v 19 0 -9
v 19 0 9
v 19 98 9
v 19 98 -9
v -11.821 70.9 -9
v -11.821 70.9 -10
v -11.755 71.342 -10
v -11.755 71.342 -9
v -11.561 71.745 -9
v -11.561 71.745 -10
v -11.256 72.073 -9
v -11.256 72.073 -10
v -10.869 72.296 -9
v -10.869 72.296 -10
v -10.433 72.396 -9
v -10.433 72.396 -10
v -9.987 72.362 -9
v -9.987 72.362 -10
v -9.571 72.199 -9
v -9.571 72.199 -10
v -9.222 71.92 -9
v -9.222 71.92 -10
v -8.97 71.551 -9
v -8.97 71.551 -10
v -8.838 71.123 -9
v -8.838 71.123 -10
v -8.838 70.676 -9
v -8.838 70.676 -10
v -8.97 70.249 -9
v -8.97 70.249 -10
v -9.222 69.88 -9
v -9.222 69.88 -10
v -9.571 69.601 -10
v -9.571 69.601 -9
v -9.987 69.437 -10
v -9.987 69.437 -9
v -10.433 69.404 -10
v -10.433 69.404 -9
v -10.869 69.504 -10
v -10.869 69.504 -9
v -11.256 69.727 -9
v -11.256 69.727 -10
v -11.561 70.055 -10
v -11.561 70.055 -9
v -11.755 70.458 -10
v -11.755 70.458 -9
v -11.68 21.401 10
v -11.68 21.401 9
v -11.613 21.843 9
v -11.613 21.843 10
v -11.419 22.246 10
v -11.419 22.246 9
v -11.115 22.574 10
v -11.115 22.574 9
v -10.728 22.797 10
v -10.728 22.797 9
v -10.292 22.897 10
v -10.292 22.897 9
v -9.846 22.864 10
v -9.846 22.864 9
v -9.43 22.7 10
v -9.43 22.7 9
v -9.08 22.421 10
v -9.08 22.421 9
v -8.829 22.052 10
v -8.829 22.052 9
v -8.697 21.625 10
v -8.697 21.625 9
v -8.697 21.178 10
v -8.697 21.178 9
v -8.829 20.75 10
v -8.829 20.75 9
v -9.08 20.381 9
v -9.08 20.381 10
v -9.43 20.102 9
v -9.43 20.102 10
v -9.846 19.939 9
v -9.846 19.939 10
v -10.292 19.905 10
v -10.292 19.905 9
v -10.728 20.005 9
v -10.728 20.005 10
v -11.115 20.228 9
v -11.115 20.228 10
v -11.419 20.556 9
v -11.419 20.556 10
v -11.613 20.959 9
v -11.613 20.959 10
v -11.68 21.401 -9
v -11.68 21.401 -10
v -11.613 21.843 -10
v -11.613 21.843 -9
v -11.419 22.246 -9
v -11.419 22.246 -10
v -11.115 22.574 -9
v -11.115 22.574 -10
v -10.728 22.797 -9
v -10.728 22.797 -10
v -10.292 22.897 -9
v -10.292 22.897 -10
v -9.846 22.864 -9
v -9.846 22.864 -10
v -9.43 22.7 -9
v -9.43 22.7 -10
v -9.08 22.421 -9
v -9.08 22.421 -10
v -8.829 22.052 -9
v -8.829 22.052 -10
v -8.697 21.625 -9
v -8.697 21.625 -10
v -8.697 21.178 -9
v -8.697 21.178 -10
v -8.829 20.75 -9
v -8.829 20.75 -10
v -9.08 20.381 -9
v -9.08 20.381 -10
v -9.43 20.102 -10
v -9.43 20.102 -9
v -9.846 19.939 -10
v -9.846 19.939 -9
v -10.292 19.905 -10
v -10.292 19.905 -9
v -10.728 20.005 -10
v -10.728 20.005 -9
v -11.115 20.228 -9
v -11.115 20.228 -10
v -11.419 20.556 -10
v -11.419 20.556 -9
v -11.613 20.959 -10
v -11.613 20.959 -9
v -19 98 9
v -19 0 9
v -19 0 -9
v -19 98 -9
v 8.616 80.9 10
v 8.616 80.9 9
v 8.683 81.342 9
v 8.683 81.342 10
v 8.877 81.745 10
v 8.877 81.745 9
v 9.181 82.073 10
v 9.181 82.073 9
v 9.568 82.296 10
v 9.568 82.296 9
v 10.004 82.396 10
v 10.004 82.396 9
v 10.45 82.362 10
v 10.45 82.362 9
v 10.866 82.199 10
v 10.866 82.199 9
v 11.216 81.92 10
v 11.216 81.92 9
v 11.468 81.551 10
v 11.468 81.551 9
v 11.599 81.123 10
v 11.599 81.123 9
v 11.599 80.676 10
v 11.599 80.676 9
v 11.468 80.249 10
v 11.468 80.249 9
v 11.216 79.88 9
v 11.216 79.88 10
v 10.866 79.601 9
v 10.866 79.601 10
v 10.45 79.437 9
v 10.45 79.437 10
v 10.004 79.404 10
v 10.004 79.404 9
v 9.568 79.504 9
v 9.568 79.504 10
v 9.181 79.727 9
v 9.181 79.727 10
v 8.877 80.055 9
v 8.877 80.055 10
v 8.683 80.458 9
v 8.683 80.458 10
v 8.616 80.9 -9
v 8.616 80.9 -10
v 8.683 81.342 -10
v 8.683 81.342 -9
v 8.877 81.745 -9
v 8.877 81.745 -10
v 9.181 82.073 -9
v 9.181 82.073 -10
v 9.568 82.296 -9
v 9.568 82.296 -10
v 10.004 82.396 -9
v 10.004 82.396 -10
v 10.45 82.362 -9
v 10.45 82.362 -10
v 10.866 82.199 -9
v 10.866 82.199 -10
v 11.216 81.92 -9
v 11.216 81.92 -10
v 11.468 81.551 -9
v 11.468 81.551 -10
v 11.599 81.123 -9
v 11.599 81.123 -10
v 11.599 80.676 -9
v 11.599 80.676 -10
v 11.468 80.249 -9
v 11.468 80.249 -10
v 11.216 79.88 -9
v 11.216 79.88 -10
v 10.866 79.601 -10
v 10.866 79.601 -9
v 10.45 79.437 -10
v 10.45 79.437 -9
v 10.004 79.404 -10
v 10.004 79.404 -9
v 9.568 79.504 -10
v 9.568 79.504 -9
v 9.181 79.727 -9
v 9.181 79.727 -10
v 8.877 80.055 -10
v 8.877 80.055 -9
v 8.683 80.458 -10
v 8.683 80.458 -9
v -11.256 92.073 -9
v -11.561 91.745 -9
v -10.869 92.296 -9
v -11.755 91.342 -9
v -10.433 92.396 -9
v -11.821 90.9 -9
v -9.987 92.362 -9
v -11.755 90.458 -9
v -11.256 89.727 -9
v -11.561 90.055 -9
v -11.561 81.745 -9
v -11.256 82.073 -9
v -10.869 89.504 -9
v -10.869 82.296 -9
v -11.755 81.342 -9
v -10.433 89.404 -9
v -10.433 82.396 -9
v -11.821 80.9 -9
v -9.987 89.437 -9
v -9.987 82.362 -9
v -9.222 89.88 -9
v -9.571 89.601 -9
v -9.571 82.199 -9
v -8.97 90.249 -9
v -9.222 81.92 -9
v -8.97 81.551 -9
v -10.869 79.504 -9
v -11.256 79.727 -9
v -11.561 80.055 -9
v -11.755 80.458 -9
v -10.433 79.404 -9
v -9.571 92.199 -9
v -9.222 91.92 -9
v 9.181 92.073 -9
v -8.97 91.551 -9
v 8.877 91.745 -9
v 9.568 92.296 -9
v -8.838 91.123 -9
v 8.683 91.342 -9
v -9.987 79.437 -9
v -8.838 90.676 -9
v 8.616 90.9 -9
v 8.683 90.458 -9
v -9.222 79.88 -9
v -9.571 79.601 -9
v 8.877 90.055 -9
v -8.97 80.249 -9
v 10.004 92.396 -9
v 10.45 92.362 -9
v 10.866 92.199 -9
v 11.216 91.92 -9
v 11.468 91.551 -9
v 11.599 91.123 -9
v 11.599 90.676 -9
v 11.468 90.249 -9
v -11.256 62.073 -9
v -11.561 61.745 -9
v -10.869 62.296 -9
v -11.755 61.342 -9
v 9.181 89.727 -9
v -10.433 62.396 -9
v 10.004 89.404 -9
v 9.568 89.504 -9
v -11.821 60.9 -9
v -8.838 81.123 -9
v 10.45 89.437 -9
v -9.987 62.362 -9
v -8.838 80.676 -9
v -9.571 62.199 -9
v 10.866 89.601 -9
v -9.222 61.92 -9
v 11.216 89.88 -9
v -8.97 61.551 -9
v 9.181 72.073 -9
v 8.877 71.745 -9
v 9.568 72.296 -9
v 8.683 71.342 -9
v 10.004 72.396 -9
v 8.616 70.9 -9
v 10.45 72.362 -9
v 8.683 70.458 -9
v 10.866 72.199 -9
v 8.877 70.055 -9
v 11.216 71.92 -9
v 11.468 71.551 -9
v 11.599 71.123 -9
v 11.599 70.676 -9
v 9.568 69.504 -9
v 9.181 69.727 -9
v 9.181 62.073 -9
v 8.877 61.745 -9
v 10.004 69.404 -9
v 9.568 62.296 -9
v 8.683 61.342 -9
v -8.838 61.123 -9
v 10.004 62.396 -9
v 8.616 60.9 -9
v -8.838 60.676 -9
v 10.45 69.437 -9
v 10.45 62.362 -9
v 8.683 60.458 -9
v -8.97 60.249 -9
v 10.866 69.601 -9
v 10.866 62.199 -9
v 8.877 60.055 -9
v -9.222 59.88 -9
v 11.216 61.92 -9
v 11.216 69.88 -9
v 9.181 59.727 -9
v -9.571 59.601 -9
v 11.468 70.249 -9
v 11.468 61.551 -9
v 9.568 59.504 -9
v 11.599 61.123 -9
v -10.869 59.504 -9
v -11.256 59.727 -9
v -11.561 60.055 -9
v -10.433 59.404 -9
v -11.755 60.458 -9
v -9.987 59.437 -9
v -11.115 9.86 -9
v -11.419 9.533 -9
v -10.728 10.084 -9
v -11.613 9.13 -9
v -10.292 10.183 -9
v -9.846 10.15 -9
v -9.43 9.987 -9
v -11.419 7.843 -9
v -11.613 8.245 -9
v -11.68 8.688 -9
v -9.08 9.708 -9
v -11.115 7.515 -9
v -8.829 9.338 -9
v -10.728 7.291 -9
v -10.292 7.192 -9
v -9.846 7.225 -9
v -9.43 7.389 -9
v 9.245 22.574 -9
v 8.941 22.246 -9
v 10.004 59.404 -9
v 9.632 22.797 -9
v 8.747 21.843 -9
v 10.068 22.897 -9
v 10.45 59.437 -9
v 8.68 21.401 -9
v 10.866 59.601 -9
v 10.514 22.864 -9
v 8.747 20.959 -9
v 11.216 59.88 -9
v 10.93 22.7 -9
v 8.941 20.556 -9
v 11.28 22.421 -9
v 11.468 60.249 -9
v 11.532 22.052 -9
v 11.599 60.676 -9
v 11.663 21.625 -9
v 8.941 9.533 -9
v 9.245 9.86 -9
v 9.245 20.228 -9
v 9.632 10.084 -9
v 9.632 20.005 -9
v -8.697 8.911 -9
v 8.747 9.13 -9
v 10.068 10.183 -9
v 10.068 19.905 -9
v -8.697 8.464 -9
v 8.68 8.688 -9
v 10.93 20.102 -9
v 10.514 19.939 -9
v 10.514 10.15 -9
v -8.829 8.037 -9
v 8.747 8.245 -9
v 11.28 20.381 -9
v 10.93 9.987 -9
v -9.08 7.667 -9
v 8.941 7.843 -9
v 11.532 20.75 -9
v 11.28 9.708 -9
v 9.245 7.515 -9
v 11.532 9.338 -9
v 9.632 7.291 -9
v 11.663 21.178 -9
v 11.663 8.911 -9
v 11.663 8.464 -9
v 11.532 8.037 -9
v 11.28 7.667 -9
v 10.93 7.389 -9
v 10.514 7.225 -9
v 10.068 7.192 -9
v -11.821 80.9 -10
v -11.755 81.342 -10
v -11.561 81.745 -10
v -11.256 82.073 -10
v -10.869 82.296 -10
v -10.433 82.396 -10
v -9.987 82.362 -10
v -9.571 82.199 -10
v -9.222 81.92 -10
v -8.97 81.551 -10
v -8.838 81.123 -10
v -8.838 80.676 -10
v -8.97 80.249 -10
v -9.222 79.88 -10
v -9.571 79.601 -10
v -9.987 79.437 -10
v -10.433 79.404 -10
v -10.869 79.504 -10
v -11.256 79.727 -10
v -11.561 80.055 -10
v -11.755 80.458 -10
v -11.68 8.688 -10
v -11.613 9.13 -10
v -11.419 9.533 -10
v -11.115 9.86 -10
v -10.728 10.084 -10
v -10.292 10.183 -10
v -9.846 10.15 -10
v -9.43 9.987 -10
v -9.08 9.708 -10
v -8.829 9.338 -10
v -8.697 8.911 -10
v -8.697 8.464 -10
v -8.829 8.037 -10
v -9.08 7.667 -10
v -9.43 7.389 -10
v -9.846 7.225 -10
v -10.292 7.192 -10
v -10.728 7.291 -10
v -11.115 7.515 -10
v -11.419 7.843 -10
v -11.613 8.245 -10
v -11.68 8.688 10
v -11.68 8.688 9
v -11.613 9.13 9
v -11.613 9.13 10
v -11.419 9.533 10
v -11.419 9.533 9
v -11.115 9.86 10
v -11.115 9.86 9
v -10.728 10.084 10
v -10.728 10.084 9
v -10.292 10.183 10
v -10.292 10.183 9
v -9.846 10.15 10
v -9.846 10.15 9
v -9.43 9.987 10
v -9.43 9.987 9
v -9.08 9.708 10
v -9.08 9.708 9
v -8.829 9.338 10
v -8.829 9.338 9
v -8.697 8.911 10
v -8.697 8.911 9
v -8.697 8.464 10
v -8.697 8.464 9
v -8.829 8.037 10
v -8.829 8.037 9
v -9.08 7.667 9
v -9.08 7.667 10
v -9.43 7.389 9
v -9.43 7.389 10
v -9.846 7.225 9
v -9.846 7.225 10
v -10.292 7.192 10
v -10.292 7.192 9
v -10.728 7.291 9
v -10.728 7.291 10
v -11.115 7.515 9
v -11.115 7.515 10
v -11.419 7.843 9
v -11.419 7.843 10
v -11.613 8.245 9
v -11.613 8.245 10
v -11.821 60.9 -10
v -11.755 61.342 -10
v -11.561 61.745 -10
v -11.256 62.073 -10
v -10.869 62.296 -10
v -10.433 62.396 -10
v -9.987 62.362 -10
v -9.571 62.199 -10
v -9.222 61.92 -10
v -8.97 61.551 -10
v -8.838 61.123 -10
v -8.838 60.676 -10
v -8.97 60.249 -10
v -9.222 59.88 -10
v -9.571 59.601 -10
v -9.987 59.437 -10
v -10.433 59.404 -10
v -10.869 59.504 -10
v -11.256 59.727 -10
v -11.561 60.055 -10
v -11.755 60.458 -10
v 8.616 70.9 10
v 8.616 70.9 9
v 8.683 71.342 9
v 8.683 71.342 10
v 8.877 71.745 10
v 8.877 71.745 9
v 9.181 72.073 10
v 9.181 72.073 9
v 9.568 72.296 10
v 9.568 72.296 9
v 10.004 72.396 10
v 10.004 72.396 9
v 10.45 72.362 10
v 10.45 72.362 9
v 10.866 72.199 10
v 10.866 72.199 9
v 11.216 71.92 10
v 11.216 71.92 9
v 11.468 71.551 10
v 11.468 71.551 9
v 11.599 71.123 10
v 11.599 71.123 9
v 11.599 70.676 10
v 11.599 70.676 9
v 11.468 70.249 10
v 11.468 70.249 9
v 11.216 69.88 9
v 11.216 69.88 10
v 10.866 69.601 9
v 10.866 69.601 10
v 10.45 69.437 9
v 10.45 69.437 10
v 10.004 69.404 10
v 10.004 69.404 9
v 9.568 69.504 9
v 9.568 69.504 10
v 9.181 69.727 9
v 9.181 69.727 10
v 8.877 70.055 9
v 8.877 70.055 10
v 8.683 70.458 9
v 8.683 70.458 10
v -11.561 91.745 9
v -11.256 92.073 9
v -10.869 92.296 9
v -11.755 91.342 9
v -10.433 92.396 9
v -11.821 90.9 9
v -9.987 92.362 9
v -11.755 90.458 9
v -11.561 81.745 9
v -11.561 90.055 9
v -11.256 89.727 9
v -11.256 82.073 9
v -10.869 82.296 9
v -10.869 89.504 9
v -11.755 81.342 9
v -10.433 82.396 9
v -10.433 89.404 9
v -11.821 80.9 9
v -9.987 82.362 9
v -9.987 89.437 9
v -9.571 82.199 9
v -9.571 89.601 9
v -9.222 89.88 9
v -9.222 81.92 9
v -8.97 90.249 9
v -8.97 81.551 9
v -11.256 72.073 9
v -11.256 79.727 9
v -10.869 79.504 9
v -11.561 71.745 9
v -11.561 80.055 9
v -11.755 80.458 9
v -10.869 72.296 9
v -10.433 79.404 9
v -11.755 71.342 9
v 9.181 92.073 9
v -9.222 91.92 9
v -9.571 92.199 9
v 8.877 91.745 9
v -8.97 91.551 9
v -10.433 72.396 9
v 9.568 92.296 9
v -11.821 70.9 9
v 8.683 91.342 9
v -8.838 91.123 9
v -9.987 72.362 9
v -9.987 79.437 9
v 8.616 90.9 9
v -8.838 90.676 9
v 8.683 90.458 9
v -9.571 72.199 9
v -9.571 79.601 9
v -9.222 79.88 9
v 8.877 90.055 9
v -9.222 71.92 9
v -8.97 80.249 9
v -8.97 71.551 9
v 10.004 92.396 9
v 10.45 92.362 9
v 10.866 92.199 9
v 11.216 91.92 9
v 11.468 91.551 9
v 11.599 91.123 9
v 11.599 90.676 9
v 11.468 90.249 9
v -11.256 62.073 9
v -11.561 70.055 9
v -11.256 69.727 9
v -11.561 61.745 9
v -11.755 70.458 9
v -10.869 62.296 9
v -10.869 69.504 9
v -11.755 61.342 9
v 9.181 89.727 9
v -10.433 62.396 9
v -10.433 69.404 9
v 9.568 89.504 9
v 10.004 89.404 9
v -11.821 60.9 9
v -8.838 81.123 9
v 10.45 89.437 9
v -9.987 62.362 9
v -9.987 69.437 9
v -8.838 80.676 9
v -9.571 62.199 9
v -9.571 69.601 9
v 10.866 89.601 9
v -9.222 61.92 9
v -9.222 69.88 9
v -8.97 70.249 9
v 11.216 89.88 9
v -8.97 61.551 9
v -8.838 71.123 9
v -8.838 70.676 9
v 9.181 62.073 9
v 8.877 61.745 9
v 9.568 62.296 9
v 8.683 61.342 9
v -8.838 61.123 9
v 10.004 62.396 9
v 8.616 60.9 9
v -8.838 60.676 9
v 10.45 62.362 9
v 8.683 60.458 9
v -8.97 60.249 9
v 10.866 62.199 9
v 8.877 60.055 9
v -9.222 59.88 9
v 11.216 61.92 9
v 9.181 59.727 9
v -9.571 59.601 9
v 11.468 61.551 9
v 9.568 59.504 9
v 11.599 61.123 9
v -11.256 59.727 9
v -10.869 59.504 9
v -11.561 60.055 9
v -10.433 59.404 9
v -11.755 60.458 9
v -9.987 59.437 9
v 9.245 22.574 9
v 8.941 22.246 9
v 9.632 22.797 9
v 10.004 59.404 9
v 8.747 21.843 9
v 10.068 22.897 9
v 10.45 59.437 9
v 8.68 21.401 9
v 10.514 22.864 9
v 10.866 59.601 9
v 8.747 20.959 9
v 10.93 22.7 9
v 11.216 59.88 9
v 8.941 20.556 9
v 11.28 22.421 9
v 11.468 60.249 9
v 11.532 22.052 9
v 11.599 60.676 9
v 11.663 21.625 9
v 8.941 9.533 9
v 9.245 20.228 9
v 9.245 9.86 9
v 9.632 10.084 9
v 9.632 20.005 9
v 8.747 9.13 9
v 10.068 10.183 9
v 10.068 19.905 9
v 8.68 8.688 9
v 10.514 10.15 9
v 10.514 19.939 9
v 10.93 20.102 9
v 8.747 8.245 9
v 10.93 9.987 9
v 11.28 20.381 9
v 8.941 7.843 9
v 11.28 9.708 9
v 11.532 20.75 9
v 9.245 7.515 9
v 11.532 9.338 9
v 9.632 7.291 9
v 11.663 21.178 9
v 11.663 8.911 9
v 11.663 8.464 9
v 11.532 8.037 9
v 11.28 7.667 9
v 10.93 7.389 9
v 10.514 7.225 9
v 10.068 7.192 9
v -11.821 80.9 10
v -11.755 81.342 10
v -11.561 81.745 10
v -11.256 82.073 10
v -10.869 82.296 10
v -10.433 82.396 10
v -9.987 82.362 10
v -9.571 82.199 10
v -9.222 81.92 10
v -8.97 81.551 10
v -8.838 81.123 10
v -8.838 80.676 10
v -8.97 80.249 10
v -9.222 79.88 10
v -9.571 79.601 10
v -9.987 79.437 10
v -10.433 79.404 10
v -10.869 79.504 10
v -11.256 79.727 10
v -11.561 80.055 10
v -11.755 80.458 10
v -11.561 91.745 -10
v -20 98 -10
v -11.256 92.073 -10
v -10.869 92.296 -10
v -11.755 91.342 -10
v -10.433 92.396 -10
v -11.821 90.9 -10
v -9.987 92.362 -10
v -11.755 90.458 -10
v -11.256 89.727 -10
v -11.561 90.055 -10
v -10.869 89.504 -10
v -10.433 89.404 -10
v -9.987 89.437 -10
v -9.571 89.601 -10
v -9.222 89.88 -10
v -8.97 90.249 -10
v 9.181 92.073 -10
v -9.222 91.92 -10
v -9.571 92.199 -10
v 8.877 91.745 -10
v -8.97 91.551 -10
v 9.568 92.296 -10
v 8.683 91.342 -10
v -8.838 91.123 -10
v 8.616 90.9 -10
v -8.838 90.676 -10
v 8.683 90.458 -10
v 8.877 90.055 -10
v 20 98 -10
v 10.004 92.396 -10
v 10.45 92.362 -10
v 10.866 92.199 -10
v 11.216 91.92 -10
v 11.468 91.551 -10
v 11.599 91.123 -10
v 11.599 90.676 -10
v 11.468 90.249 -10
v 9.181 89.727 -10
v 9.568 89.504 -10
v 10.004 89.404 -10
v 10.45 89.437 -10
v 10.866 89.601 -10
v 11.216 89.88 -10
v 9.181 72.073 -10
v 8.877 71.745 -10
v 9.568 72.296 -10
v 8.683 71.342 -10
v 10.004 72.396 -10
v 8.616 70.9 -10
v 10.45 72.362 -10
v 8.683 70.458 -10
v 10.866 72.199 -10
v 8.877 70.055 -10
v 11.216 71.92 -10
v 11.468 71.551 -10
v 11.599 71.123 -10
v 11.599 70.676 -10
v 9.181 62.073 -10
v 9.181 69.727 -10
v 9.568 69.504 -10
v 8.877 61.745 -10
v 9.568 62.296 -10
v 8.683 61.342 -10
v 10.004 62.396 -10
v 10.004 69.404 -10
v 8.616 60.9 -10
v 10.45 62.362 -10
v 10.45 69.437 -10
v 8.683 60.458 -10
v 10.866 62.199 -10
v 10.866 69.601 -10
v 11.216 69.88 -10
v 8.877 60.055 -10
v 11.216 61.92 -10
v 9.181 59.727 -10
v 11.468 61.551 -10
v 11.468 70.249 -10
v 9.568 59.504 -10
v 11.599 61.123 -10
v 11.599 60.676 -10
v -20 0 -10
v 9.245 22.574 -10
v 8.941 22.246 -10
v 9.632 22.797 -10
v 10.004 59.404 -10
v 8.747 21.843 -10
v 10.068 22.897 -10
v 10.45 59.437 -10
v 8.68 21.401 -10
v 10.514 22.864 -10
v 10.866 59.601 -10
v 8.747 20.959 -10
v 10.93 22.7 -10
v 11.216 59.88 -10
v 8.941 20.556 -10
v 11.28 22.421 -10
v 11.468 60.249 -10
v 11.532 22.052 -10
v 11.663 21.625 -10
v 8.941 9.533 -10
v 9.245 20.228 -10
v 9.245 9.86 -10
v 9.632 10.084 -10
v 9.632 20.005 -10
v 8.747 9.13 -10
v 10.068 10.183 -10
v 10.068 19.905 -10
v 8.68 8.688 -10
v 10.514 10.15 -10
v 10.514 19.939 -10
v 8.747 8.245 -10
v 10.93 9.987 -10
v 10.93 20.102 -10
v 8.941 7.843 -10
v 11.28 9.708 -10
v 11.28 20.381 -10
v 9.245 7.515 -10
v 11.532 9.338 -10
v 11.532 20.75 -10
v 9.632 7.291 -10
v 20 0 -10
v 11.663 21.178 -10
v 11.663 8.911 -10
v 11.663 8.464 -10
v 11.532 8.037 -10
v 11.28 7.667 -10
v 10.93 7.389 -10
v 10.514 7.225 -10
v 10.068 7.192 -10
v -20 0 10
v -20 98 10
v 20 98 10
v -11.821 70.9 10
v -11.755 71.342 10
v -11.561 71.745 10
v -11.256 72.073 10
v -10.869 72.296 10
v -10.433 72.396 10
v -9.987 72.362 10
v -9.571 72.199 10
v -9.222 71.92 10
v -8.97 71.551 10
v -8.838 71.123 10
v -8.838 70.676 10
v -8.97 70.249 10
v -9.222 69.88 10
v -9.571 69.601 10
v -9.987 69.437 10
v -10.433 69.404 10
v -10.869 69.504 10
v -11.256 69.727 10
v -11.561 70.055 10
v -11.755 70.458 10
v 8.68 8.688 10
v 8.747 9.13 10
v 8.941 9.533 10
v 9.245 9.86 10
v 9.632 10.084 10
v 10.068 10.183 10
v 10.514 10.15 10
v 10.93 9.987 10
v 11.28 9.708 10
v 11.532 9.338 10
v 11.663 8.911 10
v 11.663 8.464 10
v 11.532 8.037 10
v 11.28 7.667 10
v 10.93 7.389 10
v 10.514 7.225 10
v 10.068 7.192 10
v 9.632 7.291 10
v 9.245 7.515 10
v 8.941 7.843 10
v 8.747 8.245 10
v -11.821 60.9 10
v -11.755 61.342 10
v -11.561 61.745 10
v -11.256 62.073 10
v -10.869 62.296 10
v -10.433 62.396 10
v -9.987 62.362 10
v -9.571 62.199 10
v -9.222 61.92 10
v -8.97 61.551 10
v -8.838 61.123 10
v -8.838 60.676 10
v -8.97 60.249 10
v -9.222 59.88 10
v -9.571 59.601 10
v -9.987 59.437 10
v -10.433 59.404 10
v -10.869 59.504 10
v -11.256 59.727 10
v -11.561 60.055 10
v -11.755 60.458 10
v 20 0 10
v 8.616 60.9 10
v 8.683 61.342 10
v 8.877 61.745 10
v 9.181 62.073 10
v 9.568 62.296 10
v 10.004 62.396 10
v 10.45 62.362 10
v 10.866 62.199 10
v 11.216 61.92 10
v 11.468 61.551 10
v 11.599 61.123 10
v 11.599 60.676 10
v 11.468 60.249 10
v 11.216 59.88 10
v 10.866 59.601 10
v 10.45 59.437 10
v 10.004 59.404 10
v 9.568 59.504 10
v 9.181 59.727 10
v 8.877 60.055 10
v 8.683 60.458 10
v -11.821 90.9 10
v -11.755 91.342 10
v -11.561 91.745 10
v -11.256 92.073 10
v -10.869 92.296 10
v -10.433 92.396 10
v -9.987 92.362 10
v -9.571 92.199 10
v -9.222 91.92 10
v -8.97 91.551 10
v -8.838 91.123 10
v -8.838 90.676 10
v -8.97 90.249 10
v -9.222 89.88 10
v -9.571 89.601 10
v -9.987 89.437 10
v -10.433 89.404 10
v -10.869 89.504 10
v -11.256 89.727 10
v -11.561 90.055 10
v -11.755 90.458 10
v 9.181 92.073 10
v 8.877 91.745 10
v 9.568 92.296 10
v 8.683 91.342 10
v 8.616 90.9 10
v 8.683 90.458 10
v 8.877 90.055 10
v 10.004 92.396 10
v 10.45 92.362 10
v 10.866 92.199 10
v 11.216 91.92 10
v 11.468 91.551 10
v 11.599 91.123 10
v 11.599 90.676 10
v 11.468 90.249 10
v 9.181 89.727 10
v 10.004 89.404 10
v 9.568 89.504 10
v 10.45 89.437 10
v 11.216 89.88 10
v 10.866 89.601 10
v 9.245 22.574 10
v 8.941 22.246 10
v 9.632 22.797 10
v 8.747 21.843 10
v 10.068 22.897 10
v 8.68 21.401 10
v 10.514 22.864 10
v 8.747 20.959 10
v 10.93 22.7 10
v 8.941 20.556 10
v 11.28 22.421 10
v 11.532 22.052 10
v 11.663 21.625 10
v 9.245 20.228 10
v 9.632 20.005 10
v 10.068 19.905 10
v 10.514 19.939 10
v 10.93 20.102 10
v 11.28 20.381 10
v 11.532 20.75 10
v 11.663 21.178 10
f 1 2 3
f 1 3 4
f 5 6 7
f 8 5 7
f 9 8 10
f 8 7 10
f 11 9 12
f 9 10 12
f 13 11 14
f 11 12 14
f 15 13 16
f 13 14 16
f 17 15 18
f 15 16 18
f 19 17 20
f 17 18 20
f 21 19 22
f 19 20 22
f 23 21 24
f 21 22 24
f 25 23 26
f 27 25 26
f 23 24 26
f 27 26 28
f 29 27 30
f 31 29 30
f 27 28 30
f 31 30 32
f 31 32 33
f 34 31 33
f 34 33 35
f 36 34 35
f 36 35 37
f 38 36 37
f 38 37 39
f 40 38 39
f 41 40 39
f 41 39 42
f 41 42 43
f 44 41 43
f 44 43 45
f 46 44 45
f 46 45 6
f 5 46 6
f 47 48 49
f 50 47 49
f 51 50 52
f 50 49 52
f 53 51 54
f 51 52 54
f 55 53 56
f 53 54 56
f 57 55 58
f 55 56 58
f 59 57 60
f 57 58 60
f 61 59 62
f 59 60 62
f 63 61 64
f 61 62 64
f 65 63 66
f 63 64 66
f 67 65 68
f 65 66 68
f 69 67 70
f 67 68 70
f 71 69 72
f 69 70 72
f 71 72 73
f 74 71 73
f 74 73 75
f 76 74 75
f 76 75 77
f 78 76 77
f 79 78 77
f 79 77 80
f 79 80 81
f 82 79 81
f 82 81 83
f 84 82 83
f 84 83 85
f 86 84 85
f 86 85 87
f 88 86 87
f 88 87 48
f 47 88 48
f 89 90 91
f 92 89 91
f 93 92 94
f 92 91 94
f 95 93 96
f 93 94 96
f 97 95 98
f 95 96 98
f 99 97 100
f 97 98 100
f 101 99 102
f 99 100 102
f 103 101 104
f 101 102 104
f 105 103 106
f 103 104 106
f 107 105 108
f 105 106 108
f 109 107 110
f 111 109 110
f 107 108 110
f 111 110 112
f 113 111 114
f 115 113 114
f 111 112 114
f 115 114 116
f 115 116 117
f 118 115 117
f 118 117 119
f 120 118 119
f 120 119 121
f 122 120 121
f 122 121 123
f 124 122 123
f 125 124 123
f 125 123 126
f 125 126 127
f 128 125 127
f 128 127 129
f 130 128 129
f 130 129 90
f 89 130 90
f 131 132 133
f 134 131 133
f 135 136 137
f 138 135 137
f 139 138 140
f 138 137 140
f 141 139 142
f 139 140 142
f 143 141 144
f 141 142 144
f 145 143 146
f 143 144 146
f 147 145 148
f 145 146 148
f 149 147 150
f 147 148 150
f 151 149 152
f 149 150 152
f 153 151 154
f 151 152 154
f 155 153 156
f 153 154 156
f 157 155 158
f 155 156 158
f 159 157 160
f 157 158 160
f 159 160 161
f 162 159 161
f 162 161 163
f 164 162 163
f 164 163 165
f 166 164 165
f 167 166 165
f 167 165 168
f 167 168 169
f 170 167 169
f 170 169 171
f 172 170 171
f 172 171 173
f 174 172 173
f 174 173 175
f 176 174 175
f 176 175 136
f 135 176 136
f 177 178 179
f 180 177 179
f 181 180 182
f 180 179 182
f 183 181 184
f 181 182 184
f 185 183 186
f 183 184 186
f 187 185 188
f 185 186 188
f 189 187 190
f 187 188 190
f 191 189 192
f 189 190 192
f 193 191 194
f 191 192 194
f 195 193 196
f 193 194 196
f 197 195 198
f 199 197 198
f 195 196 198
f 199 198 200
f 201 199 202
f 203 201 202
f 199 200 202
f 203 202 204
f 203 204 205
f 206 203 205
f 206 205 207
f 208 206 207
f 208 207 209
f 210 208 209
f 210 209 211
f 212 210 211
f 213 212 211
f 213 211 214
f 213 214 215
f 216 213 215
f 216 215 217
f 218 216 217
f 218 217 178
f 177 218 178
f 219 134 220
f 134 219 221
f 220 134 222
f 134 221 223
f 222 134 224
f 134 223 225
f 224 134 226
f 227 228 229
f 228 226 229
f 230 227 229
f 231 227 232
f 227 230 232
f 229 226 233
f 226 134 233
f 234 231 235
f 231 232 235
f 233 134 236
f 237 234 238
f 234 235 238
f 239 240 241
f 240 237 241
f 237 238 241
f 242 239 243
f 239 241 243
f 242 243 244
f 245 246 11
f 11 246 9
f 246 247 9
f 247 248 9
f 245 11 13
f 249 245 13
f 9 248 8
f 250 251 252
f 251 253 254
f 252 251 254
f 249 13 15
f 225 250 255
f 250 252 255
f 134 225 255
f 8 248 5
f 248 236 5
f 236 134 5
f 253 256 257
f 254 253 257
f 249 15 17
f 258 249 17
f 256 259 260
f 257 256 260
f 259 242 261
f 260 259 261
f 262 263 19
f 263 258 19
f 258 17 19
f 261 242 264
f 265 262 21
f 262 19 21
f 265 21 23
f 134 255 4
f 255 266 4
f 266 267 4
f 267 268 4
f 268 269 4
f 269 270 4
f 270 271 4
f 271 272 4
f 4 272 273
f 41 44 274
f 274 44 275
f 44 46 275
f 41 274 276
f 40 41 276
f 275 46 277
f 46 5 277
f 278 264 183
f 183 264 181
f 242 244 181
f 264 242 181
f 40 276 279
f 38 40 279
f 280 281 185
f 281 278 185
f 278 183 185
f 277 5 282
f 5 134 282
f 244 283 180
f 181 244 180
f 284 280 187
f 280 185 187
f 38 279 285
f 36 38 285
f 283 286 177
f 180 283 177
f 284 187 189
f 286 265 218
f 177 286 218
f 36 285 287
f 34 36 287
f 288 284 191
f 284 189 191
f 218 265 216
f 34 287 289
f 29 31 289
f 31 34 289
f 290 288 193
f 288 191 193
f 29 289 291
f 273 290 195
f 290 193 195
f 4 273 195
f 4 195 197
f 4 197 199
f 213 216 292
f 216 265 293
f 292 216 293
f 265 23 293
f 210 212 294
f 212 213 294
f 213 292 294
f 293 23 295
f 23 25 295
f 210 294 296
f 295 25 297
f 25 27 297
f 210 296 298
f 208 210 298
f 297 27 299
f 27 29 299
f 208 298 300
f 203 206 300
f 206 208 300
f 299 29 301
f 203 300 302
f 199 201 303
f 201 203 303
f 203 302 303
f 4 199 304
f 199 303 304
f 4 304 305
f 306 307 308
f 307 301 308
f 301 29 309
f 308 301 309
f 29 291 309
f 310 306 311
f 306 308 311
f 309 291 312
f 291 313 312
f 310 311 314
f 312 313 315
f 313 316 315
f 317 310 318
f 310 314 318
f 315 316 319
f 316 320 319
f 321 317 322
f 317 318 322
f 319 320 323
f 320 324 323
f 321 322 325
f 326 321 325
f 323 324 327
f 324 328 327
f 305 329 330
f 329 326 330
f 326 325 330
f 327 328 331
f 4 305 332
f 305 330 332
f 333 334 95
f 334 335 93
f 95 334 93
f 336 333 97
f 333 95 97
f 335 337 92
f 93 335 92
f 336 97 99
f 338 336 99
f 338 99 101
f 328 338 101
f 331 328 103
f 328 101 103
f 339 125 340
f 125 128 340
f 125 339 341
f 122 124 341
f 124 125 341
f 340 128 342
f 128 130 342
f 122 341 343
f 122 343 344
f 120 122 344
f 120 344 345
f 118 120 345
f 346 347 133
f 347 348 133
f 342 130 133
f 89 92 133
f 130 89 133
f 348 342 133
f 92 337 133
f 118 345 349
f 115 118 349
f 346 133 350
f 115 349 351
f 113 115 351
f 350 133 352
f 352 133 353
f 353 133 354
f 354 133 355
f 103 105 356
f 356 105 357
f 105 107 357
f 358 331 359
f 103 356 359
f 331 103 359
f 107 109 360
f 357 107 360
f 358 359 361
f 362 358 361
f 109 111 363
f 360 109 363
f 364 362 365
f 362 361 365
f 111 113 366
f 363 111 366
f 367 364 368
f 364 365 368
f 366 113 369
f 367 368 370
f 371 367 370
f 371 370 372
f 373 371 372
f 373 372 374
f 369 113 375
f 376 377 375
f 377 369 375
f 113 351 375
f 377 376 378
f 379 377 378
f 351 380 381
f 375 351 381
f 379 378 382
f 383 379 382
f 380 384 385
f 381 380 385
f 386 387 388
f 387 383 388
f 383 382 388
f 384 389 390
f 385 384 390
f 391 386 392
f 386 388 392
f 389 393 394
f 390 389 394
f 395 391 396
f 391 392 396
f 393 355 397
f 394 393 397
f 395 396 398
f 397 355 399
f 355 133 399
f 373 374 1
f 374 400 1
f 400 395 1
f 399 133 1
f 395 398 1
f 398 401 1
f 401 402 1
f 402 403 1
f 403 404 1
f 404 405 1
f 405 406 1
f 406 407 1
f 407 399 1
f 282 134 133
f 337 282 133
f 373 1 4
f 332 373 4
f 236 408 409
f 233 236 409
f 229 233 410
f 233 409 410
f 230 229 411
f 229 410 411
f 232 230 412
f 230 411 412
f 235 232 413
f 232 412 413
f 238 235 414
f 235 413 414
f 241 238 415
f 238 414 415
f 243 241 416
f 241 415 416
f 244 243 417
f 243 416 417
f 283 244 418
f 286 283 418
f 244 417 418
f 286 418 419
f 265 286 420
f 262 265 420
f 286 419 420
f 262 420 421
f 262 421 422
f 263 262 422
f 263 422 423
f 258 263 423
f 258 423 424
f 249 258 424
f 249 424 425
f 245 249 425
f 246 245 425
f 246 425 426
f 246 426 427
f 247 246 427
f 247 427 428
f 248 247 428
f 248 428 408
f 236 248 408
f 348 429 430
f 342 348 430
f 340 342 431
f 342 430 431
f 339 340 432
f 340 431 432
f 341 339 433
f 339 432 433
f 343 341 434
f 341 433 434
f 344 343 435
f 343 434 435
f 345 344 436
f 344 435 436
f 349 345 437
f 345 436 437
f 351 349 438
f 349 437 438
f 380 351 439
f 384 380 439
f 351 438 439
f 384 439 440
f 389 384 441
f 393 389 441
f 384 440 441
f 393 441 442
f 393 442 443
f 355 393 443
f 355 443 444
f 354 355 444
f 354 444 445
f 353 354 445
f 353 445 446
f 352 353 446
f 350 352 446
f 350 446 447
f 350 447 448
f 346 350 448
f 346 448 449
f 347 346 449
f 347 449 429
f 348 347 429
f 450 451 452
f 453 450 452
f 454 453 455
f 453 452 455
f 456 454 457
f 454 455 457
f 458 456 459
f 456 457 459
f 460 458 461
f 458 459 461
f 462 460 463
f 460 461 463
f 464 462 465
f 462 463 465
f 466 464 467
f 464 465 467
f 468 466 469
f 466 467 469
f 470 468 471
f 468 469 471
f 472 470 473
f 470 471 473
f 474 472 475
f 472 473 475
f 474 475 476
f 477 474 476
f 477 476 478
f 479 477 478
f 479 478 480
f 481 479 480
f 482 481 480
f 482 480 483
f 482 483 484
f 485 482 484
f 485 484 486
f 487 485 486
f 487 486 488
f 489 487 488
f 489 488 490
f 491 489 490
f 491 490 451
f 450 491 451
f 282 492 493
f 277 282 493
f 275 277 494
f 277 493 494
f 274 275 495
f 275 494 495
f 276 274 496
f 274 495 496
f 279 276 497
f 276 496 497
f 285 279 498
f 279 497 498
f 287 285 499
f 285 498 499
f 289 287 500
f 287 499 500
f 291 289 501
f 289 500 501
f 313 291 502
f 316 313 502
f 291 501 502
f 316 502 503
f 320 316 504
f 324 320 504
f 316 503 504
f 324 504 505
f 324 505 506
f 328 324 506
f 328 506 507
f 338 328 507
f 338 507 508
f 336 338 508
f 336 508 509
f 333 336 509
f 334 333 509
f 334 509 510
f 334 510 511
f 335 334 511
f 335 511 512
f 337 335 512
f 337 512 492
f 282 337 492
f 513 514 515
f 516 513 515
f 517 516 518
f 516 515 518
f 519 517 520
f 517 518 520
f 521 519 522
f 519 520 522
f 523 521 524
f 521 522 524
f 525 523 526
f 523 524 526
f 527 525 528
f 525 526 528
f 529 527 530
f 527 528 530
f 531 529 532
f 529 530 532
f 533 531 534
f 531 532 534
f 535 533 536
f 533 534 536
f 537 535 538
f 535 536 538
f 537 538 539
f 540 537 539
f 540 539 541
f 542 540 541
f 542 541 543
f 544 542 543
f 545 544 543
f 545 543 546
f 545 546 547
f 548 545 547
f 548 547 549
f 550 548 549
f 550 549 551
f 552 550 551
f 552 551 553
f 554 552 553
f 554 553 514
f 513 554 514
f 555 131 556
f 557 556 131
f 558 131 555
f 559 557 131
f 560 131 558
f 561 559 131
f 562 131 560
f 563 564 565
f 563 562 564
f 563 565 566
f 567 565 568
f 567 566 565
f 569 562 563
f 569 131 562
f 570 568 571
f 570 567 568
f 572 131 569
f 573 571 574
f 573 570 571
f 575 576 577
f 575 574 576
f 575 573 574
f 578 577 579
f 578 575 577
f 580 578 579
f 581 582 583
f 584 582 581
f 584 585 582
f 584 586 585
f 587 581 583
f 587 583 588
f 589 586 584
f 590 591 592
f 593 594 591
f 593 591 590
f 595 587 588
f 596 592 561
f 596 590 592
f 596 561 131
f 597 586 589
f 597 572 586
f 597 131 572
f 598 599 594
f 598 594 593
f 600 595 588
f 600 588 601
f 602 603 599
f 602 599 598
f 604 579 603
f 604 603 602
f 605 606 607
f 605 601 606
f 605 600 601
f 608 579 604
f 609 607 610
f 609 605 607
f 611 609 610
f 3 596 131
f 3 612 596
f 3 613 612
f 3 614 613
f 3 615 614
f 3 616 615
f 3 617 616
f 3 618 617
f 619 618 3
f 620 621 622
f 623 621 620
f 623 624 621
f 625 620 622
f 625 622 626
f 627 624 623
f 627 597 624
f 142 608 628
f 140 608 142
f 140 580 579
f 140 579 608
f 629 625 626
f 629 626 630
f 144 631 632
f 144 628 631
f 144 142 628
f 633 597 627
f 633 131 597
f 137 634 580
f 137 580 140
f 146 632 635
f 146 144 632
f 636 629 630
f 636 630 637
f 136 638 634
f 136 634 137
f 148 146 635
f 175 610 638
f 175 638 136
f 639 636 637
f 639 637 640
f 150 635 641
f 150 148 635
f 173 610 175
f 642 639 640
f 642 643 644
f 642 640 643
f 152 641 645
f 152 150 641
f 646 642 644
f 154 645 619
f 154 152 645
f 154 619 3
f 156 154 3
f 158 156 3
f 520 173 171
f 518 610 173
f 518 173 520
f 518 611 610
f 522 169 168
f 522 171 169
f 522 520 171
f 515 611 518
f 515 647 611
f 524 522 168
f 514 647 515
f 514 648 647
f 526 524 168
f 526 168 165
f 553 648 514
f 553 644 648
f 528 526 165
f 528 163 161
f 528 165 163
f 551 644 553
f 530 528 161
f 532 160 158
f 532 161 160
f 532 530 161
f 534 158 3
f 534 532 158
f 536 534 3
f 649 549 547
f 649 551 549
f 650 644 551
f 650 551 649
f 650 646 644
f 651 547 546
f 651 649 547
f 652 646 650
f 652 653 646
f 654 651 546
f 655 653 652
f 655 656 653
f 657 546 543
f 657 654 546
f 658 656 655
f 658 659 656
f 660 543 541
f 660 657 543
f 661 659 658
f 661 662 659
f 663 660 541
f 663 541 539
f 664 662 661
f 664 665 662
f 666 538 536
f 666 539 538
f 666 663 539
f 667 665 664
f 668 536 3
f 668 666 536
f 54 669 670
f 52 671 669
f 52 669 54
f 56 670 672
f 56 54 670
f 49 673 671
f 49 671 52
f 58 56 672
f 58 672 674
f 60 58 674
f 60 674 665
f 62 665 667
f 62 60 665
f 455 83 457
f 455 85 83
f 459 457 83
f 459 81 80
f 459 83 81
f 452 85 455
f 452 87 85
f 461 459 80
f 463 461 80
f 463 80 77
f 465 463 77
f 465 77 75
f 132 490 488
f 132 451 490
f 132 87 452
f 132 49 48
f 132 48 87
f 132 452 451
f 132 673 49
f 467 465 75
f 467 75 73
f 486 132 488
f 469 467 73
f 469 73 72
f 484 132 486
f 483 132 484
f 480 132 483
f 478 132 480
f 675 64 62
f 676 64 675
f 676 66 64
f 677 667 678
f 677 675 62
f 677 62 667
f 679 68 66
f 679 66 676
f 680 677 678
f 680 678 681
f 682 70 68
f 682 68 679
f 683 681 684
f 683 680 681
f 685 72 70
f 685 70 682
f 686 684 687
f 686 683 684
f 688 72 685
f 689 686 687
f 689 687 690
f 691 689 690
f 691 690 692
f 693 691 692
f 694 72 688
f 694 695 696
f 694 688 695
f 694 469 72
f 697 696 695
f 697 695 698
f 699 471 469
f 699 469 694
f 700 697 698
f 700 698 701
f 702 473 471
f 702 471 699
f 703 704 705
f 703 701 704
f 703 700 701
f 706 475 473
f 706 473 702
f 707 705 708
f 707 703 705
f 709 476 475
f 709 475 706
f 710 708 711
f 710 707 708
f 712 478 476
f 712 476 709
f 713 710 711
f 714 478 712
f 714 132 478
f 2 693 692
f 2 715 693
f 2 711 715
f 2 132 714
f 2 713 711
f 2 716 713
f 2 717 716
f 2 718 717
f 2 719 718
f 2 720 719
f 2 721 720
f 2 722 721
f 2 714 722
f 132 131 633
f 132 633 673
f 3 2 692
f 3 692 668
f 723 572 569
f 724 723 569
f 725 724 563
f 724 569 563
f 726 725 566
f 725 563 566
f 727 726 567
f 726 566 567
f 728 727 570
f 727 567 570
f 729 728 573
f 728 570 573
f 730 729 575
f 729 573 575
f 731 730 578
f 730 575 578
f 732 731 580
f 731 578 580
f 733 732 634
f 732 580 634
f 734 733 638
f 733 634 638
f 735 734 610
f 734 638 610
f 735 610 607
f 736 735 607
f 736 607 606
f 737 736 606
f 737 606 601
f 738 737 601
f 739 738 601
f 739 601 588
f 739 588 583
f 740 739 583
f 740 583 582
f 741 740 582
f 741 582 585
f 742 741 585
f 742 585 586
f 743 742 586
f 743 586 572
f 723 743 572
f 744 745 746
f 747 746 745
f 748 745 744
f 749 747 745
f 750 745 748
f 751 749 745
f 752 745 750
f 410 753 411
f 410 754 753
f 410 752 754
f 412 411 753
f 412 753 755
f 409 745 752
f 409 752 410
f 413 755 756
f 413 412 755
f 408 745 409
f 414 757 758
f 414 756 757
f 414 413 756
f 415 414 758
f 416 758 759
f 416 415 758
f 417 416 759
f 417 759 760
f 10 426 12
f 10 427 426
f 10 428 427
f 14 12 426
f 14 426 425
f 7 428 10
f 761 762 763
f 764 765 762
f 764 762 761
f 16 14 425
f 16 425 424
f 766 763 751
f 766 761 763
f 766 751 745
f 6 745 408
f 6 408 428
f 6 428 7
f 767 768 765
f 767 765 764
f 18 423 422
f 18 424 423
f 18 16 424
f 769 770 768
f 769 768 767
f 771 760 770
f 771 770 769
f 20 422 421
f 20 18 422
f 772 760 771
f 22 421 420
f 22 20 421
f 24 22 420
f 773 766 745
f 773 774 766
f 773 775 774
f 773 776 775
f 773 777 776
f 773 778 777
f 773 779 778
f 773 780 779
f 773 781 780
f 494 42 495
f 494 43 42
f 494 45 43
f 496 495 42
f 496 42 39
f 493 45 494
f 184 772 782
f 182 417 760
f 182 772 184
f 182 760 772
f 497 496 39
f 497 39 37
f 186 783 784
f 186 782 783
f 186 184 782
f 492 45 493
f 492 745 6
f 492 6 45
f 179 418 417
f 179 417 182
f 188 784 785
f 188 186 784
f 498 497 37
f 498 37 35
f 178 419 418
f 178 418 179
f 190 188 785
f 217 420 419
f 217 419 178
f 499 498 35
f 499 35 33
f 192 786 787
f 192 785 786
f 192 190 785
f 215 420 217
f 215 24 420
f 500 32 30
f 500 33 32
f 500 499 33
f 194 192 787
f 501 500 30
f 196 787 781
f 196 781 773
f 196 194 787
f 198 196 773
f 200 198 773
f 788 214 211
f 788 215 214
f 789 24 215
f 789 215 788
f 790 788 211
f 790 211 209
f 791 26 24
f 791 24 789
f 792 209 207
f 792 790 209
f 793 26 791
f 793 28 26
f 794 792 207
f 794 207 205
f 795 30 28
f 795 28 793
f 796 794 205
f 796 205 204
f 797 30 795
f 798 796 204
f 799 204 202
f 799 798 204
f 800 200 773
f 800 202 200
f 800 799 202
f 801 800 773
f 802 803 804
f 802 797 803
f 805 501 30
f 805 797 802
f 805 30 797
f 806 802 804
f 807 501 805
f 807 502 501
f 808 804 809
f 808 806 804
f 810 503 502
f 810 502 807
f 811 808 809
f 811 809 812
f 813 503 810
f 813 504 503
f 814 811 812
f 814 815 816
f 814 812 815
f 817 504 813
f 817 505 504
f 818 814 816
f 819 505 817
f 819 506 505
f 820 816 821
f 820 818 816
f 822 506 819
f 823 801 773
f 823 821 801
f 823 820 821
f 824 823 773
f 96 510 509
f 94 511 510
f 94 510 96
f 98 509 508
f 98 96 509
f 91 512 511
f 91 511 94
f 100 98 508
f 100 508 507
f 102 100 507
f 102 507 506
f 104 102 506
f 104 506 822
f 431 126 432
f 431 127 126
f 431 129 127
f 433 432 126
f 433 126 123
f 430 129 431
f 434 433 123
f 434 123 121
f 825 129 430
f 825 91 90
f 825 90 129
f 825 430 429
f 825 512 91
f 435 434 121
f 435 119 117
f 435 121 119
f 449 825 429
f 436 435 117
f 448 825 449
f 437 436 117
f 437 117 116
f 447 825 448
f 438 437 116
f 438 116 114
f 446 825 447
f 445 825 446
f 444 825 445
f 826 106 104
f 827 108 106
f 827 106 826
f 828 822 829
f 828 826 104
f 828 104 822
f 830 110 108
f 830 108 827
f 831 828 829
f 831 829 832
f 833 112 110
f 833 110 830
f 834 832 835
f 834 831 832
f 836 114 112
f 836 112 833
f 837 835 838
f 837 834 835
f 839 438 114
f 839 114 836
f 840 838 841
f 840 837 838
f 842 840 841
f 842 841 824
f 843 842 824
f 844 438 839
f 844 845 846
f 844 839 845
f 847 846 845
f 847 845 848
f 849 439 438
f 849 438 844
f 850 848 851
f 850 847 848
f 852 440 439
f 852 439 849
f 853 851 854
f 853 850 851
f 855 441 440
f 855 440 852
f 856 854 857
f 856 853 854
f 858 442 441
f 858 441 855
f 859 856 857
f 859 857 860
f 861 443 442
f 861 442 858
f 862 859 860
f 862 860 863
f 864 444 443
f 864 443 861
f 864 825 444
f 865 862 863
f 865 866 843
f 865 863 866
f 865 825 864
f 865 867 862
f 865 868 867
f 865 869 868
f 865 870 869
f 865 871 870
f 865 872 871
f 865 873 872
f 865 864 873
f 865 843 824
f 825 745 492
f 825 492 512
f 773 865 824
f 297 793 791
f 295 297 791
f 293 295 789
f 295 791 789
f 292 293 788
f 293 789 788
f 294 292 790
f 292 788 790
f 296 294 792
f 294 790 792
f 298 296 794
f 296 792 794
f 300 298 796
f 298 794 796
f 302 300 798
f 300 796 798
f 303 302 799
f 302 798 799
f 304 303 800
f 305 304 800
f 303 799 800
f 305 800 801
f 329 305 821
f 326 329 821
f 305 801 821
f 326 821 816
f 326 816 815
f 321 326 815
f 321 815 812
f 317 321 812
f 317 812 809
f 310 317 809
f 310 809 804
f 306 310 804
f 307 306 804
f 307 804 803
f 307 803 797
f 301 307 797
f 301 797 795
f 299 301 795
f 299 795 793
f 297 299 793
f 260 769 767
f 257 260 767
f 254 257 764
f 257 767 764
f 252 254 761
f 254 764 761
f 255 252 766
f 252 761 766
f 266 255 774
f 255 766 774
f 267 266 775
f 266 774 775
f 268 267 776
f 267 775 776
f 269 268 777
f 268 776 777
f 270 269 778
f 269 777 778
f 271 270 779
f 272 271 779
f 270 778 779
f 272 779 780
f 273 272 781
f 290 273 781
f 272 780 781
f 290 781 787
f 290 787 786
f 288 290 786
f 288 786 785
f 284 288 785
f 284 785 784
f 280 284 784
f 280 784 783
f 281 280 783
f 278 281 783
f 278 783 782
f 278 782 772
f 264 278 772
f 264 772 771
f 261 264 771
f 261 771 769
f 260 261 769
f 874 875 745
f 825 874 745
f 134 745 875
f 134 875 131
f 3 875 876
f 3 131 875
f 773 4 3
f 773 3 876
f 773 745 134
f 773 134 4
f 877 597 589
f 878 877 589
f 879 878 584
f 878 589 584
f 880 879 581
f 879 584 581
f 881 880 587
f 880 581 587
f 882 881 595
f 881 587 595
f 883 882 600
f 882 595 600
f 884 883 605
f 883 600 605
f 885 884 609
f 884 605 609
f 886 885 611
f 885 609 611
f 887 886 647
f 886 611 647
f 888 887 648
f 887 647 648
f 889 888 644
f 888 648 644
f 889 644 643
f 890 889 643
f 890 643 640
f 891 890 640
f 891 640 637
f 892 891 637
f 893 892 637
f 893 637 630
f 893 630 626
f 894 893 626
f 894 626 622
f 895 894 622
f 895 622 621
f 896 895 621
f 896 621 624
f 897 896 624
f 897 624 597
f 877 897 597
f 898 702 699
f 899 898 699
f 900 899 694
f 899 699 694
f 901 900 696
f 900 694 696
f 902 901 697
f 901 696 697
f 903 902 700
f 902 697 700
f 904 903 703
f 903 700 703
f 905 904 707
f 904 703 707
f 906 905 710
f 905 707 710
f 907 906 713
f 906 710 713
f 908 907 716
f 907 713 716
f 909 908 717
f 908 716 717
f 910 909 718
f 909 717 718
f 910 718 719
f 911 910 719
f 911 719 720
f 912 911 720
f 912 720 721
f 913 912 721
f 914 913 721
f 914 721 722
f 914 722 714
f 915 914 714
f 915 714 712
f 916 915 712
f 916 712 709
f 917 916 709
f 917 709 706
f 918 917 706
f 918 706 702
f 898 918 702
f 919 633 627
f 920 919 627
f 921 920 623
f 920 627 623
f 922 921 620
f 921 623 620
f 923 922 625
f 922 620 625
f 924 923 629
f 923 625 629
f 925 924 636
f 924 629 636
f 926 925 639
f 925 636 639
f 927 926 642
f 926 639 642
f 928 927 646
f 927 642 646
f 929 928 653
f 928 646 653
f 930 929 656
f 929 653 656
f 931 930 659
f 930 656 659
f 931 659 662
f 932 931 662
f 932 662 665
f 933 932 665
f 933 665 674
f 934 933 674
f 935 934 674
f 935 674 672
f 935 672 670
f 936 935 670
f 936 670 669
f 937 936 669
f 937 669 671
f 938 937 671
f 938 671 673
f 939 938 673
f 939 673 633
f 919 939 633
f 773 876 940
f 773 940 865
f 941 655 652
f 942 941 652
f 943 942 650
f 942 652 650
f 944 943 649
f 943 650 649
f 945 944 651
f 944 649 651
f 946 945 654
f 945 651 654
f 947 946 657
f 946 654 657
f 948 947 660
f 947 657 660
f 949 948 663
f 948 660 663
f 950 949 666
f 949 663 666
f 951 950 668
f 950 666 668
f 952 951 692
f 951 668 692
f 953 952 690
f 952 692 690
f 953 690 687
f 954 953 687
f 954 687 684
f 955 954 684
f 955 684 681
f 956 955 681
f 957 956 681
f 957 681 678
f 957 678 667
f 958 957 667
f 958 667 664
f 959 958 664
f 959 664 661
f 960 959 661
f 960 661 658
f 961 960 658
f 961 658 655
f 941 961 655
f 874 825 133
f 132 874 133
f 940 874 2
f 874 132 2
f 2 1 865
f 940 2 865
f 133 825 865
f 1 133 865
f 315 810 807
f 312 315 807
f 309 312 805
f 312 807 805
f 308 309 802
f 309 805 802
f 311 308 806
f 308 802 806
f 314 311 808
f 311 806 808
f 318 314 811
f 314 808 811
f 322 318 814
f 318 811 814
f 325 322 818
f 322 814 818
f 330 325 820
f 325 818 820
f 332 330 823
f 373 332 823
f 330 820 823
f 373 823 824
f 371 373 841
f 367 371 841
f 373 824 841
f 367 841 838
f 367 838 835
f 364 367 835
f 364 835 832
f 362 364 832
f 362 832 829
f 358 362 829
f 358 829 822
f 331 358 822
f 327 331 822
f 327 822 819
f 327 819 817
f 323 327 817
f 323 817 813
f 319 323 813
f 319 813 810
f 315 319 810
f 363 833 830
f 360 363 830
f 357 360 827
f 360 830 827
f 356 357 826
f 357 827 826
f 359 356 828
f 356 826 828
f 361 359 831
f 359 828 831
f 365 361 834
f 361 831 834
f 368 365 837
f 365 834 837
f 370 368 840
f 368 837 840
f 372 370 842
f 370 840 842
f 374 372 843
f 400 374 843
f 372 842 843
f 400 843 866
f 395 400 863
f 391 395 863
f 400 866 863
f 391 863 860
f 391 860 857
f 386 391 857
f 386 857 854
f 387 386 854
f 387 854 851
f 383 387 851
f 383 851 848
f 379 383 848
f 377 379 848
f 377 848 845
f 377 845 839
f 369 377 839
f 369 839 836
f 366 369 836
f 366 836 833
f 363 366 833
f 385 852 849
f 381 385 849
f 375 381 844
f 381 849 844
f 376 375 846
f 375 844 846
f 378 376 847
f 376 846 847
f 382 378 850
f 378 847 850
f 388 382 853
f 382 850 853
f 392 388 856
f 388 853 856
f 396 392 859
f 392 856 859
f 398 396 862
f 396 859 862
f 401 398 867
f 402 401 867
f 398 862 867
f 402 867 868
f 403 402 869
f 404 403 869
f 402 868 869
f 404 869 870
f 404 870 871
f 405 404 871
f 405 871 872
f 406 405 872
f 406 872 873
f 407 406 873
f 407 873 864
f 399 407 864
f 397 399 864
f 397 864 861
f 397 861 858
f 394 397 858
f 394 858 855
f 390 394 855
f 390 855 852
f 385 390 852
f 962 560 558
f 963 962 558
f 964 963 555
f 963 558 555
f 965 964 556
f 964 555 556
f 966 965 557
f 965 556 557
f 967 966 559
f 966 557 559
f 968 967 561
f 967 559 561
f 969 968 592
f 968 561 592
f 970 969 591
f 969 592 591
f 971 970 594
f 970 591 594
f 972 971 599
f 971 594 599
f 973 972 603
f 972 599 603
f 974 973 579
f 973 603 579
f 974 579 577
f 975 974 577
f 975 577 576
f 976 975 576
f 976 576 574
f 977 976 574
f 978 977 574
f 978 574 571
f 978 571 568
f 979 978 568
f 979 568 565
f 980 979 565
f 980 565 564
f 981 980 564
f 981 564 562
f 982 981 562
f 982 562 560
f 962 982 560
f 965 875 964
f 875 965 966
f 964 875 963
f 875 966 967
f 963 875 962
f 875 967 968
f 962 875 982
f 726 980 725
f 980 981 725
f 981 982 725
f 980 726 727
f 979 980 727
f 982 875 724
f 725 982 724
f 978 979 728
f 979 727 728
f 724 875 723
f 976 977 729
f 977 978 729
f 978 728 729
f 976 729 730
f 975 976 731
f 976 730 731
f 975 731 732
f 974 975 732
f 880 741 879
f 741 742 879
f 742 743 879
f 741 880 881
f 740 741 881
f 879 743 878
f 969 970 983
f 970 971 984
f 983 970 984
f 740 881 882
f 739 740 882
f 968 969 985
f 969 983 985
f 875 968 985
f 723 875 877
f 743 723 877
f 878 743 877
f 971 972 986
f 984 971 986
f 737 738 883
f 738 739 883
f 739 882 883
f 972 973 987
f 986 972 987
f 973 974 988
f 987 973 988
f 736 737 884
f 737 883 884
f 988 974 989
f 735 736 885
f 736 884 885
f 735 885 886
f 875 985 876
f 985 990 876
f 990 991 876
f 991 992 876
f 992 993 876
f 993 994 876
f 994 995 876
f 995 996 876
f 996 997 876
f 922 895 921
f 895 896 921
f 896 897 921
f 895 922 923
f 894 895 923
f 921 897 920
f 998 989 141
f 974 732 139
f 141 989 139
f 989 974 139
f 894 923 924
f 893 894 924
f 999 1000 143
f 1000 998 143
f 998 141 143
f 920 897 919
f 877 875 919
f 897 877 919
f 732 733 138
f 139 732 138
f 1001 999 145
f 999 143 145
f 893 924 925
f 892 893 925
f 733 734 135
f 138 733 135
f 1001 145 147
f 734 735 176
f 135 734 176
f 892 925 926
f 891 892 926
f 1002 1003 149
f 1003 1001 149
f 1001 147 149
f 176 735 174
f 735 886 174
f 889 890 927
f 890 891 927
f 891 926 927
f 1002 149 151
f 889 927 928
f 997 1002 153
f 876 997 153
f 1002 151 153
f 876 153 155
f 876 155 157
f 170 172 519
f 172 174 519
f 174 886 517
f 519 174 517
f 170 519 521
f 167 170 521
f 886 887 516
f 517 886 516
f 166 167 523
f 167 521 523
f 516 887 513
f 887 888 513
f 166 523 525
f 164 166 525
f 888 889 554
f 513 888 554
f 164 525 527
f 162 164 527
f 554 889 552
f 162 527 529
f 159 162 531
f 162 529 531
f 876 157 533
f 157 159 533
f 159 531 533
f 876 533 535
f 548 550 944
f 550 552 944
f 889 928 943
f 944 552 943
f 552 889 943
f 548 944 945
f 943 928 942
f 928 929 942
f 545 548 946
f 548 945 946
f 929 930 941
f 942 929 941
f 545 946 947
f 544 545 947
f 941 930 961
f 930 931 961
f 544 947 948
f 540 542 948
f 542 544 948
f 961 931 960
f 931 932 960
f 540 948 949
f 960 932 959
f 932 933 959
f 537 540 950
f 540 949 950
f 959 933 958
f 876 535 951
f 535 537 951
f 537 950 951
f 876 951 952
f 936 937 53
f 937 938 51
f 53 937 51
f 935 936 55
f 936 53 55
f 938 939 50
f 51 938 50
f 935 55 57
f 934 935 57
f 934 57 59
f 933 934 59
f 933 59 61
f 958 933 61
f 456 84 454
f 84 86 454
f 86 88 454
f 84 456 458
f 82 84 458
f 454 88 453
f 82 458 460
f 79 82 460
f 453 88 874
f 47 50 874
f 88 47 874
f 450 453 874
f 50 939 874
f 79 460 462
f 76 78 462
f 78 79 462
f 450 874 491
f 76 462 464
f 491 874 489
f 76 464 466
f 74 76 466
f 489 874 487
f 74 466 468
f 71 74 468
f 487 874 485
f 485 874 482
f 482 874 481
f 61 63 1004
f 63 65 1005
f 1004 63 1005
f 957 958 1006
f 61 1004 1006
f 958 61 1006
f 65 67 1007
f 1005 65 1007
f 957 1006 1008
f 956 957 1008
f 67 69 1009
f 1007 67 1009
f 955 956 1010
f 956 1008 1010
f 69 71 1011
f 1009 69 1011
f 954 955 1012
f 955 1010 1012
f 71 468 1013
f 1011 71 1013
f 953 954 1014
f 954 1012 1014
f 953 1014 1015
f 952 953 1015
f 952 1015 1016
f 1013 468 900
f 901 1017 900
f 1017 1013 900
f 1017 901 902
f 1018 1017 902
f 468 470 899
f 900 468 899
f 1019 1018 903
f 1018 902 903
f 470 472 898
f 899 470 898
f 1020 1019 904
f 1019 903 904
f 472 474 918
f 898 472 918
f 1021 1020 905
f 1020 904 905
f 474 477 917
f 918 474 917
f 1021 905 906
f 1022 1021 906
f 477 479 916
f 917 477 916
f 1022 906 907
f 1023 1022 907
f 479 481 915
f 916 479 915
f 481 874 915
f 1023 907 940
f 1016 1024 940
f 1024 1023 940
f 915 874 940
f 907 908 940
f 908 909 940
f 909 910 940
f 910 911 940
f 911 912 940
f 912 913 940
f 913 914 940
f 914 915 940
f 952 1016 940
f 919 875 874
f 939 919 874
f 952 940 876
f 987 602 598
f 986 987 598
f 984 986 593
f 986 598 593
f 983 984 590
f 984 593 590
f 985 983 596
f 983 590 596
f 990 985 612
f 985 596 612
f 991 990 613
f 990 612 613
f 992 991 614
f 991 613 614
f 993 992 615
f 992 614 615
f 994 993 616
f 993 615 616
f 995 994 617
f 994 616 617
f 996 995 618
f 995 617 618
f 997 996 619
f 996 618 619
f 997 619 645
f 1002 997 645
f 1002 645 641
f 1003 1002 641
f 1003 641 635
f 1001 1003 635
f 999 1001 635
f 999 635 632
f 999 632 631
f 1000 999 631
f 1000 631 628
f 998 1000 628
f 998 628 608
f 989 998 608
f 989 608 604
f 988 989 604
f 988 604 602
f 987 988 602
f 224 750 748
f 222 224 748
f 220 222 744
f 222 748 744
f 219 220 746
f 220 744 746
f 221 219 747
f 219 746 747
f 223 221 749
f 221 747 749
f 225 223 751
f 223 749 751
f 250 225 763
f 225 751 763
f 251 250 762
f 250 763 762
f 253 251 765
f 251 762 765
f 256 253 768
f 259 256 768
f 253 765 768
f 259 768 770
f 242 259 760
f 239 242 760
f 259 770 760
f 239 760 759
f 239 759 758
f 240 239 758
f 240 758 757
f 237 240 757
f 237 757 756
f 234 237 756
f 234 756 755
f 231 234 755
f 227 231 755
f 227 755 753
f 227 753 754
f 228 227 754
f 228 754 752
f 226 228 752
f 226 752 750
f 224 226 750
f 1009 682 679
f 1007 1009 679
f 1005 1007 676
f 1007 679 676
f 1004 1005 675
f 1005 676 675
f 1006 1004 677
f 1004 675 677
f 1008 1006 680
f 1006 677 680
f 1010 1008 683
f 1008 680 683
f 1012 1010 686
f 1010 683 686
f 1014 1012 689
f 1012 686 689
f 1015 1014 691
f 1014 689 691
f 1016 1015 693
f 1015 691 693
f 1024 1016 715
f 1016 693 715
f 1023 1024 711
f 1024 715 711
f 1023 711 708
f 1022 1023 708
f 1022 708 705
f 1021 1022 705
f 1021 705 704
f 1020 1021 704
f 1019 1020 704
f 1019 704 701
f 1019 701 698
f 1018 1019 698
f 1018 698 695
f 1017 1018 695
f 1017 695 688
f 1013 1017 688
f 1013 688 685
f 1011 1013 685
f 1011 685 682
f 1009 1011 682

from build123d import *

# Parameters (mm, degrees)
SKETCH_1_W          = 40
SKETCH_1_H          = 20
EXTRUDE_1_DEPTH     = 98
SHELL_1_T           = -1
SKETCH_2_R          = 1.5
CUT_EXTRUDE_1_DEPTH = 23
SKETCH_4_R          = 1.5
CUT_EXTRUDE_2_DEPTH = 48


with BuildPart() as part:
    # Sketch 1 → Extrude 1 (new body)
    with BuildSketch(Plane(origin=(0, 0, 0), x_dir=(1, 0, 0), z_dir=(0, 1, 0))):
        Rectangle(SKETCH_1_W, SKETCH_1_H)
    extrude(amount=EXTRUDE_1_DEPTH)

    # Shell 1
    shell_1_openings = [part.faces().sort_by_distance(p)[0] for p in [
        (0, 98, 0),
        (0, 0, 0),
    ]]
    offset(amount=SHELL_1_T, openings=shell_1_openings, kind=Kind.INTERSECTION)

    # Sketch 2 → Cut-Extrude 1 (cut)
    with BuildSketch(Plane(origin=(0, 0, -10), x_dir=(-1, 0, 0), z_dir=(0, 0, -1))):
        with Locations((-10.180049386, 8.687582917)):
            Circle(SKETCH_2_R)
        with Locations((-10.180049386, 21.401128756)):
            Circle(SKETCH_2_R)
        with Locations((10.180049386, 21.401128756)):
            Circle(SKETCH_2_R)
        with Locations((10.180049386, 8.687582917)):
            Circle(SKETCH_2_R)
    extrude(amount=-CUT_EXTRUDE_1_DEPTH, mode=Mode.SUBTRACT)

    # Sketch 4 → Cut-Extrude 2 (cut)
    with BuildSketch(Plane(origin=(0, 0, -10), x_dir=(-1, 0, 0), z_dir=(0, 0, -1))):
        with Locations((10.321220159, 60.899833626)):
            Circle(SKETCH_4_R)
        with Locations((-10.116242576, 60.899833626)):
            Circle(SKETCH_4_R)
        with Locations((-10.116242576, 70.899833626)):
            Circle(SKETCH_4_R)
        with Locations((10.321220159, 70.899833626)):
            Circle(SKETCH_4_R)
        with Locations((10.321220159, 80.899833626)):
            Circle(SKETCH_4_R)
        with Locations((-10.116242576, 80.899833626)):
            Circle(SKETCH_4_R)
        with Locations((10.321220159, 90.899833626)):
            Circle(SKETCH_4_R)
        with Locations((-10.116242576, 90.899833626)):
            Circle(SKETCH_4_R)
    extrude(amount=-CUT_EXTRUDE_2_DEPTH, mode=Mode.SUBTRACT)


solid = part.part
